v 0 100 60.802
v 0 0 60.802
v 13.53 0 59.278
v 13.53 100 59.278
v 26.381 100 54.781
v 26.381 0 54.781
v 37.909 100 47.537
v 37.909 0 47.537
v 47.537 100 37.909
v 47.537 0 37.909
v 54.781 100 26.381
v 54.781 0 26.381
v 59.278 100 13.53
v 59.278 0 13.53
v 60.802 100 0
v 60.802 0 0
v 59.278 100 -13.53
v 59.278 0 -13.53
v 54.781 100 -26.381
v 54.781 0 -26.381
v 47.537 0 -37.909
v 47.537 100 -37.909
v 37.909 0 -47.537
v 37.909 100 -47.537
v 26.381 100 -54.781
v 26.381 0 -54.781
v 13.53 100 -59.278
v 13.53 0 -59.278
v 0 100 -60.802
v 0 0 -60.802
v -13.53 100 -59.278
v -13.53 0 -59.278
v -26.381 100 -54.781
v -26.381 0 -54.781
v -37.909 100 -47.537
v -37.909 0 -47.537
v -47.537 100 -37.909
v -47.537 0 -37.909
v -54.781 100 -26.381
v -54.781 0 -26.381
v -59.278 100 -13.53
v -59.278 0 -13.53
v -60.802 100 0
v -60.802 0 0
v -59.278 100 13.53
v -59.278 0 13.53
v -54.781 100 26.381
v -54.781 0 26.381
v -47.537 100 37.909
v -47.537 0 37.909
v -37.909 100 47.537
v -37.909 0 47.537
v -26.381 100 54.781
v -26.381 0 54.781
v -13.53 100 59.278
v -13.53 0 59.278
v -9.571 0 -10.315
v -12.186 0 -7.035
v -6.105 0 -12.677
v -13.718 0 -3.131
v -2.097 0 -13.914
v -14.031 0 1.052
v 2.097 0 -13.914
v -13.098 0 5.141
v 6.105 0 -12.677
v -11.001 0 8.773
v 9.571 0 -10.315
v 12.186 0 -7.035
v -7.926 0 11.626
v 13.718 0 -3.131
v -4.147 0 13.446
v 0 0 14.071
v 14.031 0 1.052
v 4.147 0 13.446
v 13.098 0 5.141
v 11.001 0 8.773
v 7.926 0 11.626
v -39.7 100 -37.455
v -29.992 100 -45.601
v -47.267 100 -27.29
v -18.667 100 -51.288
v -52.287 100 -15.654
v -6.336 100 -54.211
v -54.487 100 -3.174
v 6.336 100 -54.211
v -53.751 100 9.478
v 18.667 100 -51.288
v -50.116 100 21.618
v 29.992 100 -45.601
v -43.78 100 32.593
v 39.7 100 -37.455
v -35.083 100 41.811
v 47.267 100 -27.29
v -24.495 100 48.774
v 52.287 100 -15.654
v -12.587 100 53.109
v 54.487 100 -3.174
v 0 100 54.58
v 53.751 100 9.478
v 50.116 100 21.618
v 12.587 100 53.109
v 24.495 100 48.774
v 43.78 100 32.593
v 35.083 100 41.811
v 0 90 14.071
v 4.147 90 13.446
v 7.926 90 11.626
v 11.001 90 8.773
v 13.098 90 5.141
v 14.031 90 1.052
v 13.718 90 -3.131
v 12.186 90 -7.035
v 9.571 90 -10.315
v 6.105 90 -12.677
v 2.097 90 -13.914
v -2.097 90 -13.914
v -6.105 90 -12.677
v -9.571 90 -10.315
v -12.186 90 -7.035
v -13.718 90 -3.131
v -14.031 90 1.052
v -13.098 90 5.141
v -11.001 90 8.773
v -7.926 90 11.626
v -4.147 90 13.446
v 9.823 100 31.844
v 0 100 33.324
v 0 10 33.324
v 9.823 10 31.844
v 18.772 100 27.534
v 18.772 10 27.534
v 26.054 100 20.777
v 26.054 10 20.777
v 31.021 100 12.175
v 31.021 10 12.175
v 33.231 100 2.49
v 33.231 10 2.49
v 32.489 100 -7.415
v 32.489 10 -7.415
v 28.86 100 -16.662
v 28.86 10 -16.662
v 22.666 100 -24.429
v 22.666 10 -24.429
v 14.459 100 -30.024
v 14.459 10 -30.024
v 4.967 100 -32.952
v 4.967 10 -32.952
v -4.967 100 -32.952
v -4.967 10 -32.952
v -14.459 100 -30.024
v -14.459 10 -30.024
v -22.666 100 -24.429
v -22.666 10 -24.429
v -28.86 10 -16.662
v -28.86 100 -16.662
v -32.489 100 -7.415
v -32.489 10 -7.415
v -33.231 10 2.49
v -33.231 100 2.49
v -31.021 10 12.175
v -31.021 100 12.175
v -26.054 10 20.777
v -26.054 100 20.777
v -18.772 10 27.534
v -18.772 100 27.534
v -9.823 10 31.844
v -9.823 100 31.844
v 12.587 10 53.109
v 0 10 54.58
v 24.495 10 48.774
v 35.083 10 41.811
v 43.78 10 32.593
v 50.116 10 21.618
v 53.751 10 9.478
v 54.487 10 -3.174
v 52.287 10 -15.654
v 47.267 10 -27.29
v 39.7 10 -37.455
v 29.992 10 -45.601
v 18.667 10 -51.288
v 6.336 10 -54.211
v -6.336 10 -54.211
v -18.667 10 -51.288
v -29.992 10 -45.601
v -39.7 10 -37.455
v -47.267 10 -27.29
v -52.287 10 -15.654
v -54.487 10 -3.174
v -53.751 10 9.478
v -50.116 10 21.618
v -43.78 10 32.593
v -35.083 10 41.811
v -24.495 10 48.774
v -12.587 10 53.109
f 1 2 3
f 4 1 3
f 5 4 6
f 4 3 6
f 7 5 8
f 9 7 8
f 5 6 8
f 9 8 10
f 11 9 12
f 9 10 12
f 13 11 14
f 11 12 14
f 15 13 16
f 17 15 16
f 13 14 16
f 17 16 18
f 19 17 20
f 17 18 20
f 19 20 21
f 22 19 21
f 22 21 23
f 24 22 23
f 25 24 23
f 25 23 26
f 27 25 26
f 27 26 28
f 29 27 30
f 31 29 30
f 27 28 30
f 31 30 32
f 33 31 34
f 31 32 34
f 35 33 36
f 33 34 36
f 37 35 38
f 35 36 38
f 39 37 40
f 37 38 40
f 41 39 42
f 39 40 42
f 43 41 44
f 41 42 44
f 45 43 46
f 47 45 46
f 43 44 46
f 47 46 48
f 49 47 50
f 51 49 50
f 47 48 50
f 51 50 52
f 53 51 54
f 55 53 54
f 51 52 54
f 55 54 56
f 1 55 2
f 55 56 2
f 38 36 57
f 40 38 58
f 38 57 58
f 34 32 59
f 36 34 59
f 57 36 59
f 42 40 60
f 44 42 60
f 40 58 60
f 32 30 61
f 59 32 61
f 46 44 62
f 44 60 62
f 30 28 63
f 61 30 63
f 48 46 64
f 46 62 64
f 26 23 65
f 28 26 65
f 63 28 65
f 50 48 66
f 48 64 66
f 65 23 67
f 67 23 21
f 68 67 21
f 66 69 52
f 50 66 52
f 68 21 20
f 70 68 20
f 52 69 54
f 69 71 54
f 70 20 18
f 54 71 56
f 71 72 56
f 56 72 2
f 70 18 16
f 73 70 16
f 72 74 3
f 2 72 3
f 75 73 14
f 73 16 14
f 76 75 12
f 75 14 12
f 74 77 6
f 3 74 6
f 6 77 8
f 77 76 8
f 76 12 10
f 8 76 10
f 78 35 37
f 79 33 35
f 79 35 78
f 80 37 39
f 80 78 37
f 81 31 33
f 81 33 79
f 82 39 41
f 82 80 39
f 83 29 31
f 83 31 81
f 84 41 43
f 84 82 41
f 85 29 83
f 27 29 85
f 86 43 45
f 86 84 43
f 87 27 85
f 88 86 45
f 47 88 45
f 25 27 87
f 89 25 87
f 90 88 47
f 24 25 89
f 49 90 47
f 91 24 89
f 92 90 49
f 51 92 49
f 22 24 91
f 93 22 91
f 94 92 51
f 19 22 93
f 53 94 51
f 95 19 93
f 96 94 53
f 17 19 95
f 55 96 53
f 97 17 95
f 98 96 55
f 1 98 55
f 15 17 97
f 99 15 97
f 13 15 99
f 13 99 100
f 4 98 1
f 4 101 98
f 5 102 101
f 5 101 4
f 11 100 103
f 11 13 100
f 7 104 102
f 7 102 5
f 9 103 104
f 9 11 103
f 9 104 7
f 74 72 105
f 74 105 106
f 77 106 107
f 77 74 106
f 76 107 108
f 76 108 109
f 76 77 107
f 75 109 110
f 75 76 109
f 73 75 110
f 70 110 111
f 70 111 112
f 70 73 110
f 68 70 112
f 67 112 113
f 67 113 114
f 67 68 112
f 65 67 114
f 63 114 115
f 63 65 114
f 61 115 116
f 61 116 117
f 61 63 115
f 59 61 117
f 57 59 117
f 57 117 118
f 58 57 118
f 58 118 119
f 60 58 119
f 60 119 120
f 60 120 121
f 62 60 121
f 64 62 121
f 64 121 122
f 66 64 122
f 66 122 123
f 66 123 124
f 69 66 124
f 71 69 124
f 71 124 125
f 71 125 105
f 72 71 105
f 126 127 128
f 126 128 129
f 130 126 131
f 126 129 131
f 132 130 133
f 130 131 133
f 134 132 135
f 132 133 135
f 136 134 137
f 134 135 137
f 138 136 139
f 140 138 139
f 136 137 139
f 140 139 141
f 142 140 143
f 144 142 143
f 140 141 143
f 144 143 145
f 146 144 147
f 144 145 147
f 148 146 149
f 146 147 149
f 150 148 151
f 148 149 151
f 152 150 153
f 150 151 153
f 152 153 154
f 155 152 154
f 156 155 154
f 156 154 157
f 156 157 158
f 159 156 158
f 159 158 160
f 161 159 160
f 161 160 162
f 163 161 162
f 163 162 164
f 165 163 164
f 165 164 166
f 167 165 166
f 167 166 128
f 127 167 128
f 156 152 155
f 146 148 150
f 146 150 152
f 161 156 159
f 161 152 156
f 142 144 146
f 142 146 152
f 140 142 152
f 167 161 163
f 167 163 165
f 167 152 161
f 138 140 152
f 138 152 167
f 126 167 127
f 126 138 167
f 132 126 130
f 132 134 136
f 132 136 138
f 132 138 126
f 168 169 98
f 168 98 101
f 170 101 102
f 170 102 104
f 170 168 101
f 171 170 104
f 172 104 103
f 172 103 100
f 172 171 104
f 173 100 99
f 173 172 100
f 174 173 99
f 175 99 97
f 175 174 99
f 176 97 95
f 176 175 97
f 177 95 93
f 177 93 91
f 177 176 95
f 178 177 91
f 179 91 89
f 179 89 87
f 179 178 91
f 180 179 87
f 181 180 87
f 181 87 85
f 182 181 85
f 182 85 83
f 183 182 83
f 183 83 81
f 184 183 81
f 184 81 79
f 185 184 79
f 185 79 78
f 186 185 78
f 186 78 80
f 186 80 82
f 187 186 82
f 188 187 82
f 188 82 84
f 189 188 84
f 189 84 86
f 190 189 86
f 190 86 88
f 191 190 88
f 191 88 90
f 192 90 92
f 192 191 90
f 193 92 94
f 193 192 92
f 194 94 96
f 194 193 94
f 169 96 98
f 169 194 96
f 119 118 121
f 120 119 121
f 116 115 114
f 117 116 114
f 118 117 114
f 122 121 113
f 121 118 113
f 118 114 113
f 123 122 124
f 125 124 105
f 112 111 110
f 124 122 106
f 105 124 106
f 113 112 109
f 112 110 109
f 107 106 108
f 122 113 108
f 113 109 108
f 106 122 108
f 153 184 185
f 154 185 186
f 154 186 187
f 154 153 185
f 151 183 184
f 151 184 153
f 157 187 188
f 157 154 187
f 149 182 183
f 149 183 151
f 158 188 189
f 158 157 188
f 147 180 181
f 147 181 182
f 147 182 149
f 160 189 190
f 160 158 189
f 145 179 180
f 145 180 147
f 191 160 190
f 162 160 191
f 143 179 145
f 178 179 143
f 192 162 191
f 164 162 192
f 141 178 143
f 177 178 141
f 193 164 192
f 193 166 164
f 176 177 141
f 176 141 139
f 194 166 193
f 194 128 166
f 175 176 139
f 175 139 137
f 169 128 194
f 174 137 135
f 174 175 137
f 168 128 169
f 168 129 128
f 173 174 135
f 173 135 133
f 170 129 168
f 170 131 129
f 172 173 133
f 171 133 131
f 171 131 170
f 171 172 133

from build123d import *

# Parameters (mm, degrees)
ESBO_O1_R                  = 60.802005659
ESBO_O1_R_2                = 54.579770148
RESSALTO_EXTRUS_O1_DEPTH   = 100
ESBO_O1_R_3                = 33.324434684
ESBO_O1_R_4                = 14.070831149
RESSALTO_EXTRUS_O1_2_DEPTH = 100
ESBO_O3_R                  = 14.070831149
RESSALTO_EXTRUS_O2_DEPTH   = 10
ESBO_O1_3_R                = 54.579770148
ESBO_O1_3_R_2              = 33.324434684
RESSALTO_EXTRUS_O3_DEPTH   = 10


with BuildPart() as part:
    # Esboço1 → Ressalto-extrusão1 (new body)
    with BuildSketch(Plane(origin=(0, 0, 0), x_dir=(1, 0, 0), z_dir=(0, 1, 0))):
        Circle(ESBO_O1_R)
        Circle(ESBO_O1_R_2, mode=Mode.SUBTRACT)
    extrude(amount=RESSALTO_EXTRUS_O1_DEPTH)



with BuildPart() as body_2:
    # Esboço1 → Ressalto-extrus_o1 2 (new body)
    with BuildSketch(Plane(origin=(0, 0, 0), x_dir=(1, 0, 0), z_dir=(0, 1, 0))):
        Circle(ESBO_O1_R_3)
        Circle(ESBO_O1_R_4, mode=Mode.SUBTRACT)
    extrude(amount=RESSALTO_EXTRUS_O1_2_DEPTH)

    # Esboço3 → Ressalto-extrusão2 (add)
    with BuildSketch(Plane(origin=(0, 100, 0), x_dir=(1, 0, 0), z_dir=(0, 1, 0))):
        Circle(ESBO_O3_R)
    extrude(amount=-RESSALTO_EXTRUS_O2_DEPTH)


with BuildPart() as part_1:
    add(part.part)

    add(body_2.part)  # Ressalto-extrusão3 merges body 2
    # Esboço1<3> → Ressalto-extrusão3 (add)
    with BuildSketch(Plane(origin=(0, 0, 0), x_dir=(1, 0, 0), z_dir=(0, 1, 0))):
        Circle(ESBO_O1_3_R)
        Circle(ESBO_O1_3_R_2, mode=Mode.SUBTRACT)
    extrude(amount=RESSALTO_EXTRUS_O3_DEPTH)


solid = part_1.part
